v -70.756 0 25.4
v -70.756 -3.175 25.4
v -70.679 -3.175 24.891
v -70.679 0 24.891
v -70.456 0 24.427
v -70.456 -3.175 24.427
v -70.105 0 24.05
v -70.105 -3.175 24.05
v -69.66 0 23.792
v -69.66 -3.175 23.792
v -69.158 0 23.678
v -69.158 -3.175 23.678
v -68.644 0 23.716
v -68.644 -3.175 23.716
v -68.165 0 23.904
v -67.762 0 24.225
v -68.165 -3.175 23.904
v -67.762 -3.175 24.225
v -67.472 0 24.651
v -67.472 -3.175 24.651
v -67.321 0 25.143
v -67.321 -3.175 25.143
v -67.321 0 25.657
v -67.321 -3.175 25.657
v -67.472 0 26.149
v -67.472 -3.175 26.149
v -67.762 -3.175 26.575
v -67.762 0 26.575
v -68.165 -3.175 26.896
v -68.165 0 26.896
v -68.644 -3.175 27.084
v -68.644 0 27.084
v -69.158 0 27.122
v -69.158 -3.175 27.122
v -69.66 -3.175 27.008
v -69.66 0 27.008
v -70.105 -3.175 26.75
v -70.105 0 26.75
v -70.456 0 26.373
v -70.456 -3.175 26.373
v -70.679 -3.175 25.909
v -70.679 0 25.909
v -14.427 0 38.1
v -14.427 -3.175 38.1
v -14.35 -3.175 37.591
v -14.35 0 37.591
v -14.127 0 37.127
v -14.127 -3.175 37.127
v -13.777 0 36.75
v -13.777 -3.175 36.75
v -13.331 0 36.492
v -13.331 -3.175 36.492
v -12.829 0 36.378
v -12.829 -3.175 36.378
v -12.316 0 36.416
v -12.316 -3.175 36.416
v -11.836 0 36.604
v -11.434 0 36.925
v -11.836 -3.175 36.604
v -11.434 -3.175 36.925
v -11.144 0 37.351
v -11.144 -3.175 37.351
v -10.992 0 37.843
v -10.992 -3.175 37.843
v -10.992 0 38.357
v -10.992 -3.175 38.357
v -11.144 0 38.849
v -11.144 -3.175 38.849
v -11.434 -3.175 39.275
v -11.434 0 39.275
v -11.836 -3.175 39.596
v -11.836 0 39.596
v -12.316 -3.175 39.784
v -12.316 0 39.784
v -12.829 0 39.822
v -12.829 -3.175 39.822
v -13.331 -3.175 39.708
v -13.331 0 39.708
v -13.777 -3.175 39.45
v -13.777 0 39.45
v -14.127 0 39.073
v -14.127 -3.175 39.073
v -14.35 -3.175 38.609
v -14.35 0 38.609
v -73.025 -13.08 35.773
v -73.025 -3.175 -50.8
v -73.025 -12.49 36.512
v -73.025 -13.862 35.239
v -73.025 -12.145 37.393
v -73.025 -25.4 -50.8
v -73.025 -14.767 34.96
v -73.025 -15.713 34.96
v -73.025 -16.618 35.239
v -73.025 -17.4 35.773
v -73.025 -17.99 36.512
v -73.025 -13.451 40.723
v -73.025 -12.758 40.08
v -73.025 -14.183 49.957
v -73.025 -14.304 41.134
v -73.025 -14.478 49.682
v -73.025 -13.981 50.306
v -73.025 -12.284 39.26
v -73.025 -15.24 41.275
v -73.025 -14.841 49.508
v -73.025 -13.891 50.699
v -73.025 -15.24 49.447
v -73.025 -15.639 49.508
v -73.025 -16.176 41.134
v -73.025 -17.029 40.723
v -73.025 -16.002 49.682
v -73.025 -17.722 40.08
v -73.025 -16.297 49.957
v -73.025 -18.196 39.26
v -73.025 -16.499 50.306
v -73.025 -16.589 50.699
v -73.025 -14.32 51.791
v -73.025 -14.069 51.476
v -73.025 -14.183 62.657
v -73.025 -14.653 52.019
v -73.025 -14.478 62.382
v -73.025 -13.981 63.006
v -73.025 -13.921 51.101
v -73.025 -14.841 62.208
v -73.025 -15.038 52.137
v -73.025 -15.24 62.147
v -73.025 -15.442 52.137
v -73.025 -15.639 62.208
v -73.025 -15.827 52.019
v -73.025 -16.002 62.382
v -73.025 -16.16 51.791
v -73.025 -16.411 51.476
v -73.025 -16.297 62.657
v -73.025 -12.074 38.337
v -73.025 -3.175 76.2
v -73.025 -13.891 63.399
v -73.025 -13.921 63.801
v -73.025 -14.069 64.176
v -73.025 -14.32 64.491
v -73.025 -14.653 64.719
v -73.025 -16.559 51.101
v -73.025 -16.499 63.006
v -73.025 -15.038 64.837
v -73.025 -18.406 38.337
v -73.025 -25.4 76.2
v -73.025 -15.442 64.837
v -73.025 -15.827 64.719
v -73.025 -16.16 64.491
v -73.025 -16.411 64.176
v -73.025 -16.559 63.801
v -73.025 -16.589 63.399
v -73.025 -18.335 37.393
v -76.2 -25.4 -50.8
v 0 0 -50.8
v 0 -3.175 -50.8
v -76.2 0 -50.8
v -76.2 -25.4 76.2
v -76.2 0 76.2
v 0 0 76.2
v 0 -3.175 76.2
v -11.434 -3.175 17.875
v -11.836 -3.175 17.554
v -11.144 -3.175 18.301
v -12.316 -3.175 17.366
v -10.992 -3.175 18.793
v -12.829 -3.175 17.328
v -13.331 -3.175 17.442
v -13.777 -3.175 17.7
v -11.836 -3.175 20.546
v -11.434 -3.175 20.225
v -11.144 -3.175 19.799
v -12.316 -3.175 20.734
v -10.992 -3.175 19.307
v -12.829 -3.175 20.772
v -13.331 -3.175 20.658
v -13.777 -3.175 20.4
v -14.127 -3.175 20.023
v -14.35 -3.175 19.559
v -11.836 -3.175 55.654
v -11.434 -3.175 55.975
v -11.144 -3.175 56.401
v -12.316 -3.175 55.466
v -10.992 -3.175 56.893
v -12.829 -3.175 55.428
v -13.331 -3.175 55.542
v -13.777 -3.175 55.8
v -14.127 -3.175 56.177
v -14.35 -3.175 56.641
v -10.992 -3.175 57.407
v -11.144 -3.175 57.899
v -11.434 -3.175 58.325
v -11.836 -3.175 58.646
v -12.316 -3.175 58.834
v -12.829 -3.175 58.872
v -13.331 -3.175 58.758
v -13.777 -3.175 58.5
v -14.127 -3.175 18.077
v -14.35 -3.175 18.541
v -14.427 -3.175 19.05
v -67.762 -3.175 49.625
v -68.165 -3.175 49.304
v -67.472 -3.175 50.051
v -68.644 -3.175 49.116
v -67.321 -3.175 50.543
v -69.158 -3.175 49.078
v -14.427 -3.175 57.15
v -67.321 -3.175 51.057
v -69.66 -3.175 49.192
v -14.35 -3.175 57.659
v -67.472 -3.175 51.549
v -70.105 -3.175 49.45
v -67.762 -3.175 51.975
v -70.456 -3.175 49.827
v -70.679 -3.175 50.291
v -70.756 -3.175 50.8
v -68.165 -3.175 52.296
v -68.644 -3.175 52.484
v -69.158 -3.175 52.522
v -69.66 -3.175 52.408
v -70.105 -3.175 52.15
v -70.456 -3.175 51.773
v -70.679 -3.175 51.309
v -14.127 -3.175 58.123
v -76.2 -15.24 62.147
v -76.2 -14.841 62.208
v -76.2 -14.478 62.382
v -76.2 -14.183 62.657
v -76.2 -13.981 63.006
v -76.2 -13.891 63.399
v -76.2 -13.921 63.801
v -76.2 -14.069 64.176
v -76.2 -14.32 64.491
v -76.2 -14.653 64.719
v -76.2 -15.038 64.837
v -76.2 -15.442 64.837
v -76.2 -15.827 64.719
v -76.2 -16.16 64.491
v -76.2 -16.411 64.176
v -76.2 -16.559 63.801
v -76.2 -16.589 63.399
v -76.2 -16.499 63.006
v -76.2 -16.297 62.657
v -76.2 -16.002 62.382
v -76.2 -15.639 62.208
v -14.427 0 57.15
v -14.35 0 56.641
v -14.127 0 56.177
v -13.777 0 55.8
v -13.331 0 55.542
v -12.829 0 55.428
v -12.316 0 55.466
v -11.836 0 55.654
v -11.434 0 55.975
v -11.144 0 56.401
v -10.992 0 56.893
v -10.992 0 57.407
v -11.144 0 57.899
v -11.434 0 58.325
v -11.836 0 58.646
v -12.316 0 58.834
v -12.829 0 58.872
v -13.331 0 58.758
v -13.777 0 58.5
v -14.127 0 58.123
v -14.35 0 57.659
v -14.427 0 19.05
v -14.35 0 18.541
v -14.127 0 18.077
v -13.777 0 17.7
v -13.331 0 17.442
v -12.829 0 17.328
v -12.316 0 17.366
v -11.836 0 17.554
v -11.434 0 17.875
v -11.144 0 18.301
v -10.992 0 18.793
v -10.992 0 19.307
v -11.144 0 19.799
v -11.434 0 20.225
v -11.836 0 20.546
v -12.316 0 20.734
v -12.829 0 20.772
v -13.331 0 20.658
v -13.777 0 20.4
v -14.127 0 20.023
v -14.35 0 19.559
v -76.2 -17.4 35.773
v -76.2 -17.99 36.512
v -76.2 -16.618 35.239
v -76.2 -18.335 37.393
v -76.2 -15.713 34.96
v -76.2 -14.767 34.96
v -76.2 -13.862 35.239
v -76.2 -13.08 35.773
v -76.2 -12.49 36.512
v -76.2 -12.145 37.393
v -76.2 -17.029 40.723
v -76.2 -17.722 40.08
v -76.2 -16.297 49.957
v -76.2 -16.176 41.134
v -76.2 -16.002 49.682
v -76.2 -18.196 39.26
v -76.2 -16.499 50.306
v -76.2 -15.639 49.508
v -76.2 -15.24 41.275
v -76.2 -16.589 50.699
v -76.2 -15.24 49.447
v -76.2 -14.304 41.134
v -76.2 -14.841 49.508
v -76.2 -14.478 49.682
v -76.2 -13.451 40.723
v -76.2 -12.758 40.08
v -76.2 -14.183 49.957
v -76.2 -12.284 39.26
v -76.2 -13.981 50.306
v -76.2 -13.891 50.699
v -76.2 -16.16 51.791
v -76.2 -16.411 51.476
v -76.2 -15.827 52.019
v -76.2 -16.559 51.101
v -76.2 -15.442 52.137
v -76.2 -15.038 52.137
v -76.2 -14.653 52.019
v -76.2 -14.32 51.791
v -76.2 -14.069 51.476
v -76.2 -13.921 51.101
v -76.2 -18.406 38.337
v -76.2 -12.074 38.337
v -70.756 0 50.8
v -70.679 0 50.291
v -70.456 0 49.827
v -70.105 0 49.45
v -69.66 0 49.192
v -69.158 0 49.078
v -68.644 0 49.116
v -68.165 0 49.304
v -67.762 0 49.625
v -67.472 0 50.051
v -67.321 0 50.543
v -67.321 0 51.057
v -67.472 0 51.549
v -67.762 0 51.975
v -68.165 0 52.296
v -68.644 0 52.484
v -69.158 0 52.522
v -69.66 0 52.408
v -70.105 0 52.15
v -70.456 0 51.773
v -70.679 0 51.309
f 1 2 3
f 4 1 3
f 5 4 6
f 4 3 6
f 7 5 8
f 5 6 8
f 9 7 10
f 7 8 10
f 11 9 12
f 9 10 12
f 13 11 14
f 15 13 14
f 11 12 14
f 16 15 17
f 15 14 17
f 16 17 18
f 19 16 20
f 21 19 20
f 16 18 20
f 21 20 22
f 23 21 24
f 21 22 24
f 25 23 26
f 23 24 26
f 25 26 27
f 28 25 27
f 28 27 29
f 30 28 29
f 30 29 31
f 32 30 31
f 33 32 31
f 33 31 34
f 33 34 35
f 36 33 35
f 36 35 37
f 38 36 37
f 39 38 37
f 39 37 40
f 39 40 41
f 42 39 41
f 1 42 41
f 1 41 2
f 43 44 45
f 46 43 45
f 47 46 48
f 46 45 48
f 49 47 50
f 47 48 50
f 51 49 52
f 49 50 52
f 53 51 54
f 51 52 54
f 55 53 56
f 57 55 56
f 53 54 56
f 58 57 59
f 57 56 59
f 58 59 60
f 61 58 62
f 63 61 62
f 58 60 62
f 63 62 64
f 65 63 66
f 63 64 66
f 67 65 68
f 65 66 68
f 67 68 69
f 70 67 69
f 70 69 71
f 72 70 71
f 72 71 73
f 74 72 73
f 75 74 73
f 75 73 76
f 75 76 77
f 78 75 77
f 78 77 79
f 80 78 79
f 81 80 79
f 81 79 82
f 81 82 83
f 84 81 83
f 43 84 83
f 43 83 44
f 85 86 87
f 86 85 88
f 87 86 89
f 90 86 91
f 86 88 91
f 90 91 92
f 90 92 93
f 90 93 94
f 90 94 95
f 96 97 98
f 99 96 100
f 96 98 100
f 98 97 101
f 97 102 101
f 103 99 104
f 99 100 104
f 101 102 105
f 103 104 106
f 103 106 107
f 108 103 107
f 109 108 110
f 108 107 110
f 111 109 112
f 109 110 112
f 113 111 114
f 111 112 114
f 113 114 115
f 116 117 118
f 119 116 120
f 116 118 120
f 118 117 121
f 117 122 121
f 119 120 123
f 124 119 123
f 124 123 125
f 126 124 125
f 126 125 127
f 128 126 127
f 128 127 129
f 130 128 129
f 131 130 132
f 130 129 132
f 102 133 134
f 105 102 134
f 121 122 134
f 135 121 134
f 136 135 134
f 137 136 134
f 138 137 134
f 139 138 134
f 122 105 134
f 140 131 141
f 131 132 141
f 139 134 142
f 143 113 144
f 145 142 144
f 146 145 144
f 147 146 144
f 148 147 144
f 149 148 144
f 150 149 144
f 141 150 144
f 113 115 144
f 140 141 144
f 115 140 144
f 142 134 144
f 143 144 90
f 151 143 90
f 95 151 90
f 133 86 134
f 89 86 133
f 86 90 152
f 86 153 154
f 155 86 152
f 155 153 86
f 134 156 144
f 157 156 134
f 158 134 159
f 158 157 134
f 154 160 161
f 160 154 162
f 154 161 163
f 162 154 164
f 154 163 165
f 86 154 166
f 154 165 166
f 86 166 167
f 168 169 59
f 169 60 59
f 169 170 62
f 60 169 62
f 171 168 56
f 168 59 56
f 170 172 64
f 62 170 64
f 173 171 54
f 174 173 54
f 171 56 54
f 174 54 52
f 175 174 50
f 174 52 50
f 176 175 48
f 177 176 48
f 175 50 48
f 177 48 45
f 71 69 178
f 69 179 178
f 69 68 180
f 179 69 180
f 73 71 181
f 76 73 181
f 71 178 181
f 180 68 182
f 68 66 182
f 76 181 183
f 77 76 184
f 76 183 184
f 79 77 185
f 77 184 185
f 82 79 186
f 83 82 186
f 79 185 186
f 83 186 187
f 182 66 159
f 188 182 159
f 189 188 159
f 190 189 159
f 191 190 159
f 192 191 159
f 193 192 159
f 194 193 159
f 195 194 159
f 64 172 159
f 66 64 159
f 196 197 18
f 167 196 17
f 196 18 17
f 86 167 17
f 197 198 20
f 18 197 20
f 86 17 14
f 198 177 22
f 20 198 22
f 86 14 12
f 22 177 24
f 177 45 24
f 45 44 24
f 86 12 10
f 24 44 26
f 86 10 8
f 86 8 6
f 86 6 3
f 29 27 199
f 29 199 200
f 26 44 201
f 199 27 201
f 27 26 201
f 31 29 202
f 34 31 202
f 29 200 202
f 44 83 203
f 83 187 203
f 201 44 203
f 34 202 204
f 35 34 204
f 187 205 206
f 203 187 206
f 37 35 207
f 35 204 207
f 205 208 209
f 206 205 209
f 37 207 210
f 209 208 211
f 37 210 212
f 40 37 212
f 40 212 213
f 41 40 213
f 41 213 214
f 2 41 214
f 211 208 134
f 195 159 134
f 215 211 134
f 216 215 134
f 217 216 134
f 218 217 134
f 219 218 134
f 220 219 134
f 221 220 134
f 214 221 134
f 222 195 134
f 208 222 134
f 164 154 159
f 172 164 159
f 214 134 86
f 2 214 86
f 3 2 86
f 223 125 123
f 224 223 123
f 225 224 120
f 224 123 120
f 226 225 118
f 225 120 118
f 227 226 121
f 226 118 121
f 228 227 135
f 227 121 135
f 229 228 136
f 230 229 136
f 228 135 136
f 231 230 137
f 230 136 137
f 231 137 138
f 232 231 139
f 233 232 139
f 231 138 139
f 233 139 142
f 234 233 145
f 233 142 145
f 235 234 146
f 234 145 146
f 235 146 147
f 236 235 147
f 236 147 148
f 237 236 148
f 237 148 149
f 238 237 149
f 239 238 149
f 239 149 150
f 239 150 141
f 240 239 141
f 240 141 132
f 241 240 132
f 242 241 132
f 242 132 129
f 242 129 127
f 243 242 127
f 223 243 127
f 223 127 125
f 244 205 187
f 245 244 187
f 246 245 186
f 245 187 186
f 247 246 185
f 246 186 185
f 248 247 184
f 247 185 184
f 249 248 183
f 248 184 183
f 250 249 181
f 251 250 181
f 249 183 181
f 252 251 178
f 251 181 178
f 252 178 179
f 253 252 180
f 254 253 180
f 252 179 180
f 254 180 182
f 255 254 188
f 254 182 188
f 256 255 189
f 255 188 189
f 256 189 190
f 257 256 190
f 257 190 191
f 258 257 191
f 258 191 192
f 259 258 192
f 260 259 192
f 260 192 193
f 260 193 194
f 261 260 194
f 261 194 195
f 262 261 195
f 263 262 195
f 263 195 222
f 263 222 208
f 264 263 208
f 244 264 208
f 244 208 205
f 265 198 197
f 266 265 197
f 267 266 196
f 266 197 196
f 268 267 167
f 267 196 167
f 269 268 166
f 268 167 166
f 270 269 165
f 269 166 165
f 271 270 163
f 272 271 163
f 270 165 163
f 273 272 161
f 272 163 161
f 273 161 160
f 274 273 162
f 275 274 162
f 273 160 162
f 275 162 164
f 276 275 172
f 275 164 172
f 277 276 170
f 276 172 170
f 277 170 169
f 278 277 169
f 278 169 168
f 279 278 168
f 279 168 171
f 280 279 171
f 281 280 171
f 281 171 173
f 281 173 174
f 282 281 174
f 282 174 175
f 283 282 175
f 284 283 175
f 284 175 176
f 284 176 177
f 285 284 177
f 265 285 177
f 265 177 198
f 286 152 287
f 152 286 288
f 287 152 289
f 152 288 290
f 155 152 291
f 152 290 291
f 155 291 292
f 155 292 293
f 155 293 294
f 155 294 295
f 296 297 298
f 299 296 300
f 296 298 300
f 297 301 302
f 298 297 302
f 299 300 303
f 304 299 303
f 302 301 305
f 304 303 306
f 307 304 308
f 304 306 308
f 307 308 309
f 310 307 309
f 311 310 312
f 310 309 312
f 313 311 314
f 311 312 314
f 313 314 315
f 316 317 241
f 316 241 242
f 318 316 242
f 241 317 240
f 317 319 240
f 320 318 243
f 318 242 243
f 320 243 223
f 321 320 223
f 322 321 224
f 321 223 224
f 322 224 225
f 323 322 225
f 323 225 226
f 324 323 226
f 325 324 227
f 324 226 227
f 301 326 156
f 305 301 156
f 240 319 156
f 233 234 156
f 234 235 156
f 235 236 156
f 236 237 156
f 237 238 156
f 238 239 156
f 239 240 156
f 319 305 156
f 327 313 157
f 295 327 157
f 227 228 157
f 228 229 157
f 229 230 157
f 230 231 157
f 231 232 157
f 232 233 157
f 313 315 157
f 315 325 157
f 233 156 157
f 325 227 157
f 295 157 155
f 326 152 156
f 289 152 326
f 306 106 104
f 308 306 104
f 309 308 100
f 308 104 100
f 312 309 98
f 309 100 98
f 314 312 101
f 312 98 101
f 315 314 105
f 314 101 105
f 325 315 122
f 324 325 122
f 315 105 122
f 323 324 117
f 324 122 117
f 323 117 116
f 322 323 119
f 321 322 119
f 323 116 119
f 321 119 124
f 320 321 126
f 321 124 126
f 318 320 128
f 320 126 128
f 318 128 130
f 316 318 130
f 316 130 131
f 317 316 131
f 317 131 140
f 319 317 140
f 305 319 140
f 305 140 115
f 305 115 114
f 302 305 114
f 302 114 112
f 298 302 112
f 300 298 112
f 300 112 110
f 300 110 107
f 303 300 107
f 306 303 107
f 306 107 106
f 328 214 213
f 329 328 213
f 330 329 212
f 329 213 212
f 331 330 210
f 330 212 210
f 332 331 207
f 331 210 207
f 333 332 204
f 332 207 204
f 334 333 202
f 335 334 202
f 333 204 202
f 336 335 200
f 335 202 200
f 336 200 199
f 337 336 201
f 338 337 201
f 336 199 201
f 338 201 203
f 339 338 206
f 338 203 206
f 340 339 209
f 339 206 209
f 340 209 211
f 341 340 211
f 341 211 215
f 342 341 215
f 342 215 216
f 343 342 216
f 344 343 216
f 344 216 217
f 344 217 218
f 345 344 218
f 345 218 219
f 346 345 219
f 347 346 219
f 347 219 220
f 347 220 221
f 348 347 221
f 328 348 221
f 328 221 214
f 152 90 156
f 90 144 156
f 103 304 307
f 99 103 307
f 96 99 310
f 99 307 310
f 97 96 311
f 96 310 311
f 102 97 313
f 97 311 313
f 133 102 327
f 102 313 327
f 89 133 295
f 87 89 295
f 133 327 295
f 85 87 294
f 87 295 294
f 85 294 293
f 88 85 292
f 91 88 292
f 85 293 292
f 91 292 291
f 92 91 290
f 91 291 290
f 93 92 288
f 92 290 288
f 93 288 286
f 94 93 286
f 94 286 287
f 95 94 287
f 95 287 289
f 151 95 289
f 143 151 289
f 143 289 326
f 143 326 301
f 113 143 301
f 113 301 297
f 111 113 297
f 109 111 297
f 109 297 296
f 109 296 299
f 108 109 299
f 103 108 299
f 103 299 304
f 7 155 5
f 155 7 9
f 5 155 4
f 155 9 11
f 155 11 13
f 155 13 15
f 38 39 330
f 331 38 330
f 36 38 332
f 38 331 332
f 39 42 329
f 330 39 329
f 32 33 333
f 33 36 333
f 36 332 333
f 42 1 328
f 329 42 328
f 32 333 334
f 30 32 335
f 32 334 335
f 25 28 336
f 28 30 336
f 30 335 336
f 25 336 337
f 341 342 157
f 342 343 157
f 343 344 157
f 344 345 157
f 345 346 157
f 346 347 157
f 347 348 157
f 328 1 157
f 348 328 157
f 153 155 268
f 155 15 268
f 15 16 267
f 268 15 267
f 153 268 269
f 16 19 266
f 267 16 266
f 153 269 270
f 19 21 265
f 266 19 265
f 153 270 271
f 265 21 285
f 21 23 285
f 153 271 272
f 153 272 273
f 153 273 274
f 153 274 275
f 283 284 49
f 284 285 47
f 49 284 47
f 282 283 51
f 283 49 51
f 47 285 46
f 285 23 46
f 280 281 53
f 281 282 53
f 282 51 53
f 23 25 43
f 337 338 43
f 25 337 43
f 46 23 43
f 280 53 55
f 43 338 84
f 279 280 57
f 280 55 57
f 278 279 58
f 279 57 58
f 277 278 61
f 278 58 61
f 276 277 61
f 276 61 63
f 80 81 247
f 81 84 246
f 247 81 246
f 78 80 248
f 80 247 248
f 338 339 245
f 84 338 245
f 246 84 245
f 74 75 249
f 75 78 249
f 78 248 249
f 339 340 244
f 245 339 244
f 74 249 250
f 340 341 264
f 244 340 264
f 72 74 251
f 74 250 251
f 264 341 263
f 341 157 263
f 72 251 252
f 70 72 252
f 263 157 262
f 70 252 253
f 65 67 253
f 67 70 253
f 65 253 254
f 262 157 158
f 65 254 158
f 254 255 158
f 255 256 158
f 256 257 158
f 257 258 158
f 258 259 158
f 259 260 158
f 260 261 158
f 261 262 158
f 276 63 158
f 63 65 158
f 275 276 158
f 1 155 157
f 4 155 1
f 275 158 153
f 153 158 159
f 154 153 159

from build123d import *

# Parameters (mm, degrees)
BOSS_EXTRUDE1_DEPTH       = 76.2
CUT_EXTRUDE1_REACH        = 112.716
SKETCH7_R                 = 3.175
TAP_DRILL_FOR_8_32_TAP2_D = 3.4544
TAP_DRILL_FOR_8_32_TAP4_D = 3.4544
TAP_DRILL_FOR_6_32_TAP1_D = 2.7051
BOSS_EXTRUDE2_DEPTH       = 50.8


with BuildPart() as part:
    # Sketch2 → Boss-Extrude1 (new body)
    with BuildSketch(Plane.XY):
        Polygon((0, 0), (-76.2, 0), (-76.2, -25.4), (-73.025, -25.4), (-73.025, -3.175), (0, -3.175), align=None)
    extrude(amount=BOSS_EXTRUDE1_DEPTH)

    # Sketch7 → Cut-Extrude1 (cut, up to next)
    with BuildSketch(Plane.ZY.offset(76.2), mode=Mode.PRIVATE) as cut_extrude1_sk1:
        with Locations((38.1, -15.24)):
            Circle(SKETCH7_R)
    cut_extrude1_tool1 = extrude(cut_extrude1_sk1.sketch, amount=-CUT_EXTRUDE1_REACH, mode=Mode.PRIVATE) & part.part
    add(cut_extrude1_tool1.solids().sort_by_distance((-76.2, -15.24, 38.1))[0], mode=Mode.SUBTRACT)

    # Tap Drill for #8-32 Tap2 (through all)
    with Locations(Plane(origin=(0, 0, 0), x_dir=(1, 0, 0), z_dir=(0, 1, 0))):
        with Locations((-12.7, -19.05), (-12.7, -38.1), (-12.7, -57.15)):
            Hole(TAP_DRILL_FOR_8_32_TAP2_D / 2)

    # Tap Drill for #8-32 Tap4 (through all)
    with Locations(Plane(origin=(0, 0, 0), x_dir=(1, 0, 0), z_dir=(0, 1, 0))):
        with Locations((-69.028514561, -25.4), (-69.028514561, -50.8)):
            Hole(TAP_DRILL_FOR_8_32_TAP4_D / 2)

    # Tap Drill for #6-32 Tap1 (through all)
    with Locations(Plane.ZY.offset(76.2)):
        with Locations((50.8, -15.24), (63.5, -15.24)):
            Hole(TAP_DRILL_FOR_6_32_TAP1_D / 2)

    # Sketch19 → Boss-Extrude2 (add)
    with BuildSketch(Plane(origin=(0, 0, 0), x_dir=(-1, 0, 0), z_dir=(0, 0, -1))):
        Polygon((0, -3.175), (73.025, -3.175), (73.025, -25.4), (76.2, -25.4), (76.2, 0), (0, 0), align=None)
    extrude(amount=BOSS_EXTRUDE2_DEPTH)


solid = part.part
